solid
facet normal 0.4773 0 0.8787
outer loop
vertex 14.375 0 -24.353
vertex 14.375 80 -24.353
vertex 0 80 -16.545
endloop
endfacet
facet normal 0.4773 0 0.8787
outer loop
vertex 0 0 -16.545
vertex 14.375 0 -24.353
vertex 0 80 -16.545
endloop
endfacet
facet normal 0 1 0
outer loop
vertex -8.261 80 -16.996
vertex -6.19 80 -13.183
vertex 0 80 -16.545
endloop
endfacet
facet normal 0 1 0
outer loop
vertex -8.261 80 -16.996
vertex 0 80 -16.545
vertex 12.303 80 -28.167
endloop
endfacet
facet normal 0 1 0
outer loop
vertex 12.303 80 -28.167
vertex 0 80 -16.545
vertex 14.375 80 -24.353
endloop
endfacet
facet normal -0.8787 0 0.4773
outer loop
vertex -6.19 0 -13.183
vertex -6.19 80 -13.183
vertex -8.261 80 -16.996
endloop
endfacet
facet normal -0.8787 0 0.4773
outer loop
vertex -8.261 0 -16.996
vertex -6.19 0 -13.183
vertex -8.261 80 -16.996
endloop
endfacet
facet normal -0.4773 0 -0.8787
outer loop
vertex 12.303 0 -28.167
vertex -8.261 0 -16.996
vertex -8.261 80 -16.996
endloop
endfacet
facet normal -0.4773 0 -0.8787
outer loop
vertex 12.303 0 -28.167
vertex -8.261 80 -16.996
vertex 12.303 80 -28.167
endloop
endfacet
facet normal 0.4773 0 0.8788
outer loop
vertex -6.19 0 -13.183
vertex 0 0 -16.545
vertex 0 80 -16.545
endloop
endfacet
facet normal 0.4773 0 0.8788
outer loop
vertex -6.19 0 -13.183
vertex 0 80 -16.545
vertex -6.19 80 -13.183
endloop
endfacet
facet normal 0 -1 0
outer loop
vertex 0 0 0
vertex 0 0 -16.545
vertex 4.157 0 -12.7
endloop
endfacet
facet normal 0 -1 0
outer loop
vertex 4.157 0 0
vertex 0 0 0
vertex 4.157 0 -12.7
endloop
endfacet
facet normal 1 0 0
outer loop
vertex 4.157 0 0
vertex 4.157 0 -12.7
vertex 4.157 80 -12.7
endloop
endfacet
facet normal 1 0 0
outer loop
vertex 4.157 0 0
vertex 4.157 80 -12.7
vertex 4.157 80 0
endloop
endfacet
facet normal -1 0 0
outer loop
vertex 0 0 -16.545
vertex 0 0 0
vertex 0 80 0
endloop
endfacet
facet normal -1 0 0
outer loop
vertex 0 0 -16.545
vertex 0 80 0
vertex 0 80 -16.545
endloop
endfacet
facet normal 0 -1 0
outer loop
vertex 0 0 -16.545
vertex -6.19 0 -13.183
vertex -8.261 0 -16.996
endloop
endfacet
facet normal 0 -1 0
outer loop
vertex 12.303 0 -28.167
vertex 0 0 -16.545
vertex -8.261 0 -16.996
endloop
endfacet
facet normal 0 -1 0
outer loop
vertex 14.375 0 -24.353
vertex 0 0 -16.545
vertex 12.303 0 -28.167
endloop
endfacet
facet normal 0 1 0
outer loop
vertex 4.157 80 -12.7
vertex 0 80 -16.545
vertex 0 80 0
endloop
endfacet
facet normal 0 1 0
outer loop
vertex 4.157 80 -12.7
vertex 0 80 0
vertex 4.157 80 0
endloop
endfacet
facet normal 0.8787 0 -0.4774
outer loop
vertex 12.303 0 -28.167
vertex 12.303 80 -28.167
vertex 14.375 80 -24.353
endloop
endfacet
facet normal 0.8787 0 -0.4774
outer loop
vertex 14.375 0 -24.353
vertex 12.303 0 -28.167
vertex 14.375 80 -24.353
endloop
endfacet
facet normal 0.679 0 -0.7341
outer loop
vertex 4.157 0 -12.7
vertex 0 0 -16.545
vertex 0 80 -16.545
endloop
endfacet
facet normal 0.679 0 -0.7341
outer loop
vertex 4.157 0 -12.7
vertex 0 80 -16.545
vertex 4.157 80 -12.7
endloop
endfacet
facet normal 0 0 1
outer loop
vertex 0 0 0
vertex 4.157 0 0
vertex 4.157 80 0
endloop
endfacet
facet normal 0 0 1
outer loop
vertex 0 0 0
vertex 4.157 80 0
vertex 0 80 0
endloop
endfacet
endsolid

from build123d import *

# Parameters (mm, degrees)
F1_DEPTH = 80


with BuildPart() as f1:
    # F0 (on Front) → F1 (new body)
    with BuildSketch(Plane.XZ):
        Polygon((14.374554, -24.353451), (0, -16.545052), (-6.189556, -13.182824), (-8.260938, -16.99605), (12.303172, -28.166677), align=None)
        Polygon((4.157281, 0), (0, 0), (0, -16.545052), (4.157281, -12.699814), align=None)
    extrude(amount=-F1_DEPTH)


solid = f1.part
